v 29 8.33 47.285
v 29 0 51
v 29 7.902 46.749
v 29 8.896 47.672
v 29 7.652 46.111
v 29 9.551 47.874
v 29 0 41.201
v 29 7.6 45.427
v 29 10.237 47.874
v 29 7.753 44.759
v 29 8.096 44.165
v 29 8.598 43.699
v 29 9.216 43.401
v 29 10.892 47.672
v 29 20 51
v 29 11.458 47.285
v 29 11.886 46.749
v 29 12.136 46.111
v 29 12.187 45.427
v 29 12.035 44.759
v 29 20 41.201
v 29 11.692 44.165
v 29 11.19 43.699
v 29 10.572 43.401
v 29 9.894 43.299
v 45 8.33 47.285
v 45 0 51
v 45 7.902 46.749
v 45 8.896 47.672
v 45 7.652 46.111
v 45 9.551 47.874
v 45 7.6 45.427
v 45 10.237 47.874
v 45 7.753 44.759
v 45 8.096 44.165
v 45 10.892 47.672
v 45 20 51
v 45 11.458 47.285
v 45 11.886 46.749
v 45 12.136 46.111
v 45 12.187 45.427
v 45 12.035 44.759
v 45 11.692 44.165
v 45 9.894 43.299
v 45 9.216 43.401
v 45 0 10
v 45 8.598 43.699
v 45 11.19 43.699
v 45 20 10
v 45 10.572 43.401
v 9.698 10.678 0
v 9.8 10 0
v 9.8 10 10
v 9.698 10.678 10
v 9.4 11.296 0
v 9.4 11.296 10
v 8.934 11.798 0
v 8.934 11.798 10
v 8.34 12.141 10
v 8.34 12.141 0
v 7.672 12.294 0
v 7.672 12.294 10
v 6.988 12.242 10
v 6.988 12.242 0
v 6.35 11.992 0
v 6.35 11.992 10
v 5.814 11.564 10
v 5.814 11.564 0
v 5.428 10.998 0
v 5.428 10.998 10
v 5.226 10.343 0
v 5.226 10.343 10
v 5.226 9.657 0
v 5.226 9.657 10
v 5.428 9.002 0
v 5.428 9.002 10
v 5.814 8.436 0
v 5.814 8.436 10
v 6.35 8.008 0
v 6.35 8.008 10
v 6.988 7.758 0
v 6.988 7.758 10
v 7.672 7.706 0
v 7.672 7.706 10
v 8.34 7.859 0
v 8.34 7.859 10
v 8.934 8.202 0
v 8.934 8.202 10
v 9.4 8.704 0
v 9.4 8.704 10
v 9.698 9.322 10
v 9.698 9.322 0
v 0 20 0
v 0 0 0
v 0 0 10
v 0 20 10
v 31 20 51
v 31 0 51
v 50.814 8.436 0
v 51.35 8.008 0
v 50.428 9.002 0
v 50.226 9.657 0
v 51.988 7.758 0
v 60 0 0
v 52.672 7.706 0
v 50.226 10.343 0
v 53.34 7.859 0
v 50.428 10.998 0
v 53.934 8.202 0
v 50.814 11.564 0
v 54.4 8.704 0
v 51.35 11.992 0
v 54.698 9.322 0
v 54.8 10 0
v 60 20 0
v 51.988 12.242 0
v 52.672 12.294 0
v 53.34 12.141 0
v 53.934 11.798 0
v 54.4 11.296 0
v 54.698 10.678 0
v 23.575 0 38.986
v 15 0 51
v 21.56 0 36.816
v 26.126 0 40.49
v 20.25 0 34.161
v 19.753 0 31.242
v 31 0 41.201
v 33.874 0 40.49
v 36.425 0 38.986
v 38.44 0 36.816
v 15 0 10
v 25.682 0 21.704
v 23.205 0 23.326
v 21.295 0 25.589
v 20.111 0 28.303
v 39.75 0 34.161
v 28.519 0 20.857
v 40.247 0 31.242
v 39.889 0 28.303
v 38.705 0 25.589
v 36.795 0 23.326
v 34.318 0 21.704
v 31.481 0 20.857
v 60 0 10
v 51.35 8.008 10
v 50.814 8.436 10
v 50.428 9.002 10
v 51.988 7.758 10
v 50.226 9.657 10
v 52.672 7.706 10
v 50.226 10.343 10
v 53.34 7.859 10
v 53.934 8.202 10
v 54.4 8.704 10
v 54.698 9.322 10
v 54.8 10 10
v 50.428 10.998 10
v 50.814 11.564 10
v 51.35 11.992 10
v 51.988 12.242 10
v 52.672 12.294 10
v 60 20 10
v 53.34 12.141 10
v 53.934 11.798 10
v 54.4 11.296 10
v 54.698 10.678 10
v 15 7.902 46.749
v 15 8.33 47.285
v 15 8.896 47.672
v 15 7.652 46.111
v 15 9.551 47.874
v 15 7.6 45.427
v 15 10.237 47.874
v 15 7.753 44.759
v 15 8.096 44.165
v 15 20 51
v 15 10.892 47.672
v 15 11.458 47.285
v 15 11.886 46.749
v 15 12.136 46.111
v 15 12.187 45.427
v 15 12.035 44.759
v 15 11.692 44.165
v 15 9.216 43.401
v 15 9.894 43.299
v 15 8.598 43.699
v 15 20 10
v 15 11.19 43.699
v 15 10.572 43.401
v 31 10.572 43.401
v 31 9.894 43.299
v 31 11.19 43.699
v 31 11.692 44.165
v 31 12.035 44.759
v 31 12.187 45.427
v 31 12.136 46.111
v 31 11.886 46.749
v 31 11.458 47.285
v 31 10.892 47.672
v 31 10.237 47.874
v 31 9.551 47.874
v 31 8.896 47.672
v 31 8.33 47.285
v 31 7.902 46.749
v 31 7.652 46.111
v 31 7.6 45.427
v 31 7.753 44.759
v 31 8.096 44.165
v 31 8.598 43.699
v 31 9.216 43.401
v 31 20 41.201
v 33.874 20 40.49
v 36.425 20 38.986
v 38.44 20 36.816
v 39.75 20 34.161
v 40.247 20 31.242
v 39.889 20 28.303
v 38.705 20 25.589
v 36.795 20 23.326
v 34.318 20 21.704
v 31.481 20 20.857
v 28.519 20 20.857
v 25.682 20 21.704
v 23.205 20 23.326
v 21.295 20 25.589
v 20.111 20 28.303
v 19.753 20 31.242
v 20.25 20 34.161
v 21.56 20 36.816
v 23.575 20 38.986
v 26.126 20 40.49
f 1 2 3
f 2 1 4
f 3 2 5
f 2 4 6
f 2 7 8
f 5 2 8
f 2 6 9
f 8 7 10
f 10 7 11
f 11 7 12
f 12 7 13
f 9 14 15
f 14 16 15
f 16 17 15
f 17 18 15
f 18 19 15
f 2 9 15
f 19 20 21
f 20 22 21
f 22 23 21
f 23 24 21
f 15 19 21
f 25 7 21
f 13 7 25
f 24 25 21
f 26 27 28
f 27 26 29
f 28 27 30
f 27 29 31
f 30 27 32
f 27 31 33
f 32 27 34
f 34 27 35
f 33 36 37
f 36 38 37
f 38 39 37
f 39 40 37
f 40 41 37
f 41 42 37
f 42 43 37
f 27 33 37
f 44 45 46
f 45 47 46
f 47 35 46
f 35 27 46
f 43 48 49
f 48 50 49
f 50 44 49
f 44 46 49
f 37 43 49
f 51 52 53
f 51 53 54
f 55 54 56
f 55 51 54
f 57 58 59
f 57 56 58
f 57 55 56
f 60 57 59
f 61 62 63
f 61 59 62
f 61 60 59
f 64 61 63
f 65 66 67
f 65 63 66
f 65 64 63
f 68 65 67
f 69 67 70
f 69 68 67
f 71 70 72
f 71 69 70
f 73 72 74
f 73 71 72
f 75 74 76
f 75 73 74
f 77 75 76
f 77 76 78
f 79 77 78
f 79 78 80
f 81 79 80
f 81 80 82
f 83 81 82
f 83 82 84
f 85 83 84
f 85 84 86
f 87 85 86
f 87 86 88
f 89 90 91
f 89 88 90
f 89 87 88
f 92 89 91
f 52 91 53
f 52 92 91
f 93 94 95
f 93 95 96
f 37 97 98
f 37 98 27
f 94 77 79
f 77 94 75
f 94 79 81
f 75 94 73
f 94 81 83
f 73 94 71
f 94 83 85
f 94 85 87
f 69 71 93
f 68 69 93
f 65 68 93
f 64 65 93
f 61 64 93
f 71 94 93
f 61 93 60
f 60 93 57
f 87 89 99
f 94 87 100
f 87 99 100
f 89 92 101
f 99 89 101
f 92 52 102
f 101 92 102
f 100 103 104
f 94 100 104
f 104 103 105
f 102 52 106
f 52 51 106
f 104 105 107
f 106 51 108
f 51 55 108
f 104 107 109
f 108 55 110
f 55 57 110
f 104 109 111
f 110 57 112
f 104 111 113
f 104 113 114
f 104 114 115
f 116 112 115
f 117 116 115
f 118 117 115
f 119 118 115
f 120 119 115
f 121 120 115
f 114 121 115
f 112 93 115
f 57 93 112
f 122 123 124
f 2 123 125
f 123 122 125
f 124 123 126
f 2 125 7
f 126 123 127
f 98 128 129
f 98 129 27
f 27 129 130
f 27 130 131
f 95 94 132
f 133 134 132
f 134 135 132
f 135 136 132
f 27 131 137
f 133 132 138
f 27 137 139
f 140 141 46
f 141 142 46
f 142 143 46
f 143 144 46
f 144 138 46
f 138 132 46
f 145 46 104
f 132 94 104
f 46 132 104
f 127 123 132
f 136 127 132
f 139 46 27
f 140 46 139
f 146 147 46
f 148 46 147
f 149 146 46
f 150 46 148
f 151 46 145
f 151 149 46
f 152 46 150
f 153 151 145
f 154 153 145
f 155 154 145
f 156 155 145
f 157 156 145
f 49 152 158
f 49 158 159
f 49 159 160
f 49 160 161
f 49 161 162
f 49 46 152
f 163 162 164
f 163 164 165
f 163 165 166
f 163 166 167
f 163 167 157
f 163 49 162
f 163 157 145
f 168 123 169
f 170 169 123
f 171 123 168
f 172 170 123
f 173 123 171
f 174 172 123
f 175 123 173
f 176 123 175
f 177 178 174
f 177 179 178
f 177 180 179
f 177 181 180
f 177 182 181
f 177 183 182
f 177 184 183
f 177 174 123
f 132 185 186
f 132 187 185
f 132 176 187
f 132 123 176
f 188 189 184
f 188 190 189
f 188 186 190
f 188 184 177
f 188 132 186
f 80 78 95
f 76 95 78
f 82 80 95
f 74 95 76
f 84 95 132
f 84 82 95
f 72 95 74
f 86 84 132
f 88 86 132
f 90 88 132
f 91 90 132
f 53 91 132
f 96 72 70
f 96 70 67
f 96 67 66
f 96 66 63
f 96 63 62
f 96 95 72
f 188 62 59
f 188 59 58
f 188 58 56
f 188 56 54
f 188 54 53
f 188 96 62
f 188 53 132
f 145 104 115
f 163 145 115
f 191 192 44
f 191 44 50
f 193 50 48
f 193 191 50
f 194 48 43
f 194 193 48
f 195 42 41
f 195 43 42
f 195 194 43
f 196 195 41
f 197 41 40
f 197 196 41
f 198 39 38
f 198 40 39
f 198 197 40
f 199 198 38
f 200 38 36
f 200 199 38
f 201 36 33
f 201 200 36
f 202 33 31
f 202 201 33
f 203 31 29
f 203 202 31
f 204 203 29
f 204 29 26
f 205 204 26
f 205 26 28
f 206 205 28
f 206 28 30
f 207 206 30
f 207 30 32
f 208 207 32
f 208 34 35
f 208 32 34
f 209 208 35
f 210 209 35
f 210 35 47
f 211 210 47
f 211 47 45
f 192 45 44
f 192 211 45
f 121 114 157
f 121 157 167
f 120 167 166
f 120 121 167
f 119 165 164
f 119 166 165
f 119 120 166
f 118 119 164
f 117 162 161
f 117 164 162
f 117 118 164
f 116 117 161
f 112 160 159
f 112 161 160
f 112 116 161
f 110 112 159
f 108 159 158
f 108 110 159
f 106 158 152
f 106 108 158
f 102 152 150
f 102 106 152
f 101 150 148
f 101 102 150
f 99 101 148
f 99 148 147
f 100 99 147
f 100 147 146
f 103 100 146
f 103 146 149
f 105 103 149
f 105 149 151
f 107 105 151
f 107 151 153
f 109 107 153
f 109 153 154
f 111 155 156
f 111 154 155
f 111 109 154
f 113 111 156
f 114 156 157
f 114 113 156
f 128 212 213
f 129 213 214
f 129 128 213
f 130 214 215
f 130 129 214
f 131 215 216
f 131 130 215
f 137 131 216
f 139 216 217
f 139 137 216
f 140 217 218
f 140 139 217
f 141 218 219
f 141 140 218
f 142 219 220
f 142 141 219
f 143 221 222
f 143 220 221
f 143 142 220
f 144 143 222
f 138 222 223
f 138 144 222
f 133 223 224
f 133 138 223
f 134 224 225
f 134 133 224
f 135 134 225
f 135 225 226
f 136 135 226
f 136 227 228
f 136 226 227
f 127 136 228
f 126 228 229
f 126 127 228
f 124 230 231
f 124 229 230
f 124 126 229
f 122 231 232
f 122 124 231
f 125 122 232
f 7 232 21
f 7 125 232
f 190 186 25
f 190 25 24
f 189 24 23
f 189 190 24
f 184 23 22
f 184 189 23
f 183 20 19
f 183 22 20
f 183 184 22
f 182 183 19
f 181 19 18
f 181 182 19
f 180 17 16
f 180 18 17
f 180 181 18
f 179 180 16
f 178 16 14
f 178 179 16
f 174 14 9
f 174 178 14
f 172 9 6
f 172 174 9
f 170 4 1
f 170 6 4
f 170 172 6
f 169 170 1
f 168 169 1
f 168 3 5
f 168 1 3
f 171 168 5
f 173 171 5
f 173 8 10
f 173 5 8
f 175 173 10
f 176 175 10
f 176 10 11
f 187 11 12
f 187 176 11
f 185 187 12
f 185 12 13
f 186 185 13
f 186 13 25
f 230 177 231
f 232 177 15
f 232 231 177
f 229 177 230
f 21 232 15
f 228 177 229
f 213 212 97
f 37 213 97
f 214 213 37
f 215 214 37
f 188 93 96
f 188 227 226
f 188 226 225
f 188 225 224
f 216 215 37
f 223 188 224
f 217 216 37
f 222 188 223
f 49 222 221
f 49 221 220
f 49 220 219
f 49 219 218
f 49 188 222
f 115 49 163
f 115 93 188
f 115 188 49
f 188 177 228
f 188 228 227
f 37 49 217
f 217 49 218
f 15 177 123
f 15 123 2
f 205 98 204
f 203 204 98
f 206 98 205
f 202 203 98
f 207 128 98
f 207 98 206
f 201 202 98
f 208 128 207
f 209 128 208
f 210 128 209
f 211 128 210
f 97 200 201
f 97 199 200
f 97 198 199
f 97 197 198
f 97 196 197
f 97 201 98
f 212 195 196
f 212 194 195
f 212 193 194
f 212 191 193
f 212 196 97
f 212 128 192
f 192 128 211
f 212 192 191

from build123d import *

# Parameters (mm, degrees)
BOX002_W                    = 2
BOX002_H                    = 25
BOX002_DEPTH                = 15
CYLINDER003_R               = 2.3
CYLINDER003_DEPTH           = 33
CYLINDER003_PITCH_ANGLE     = 90
CYLINDER003_PLACEMENT_ANGLE = 7e-06
CYLINDER002_R               = 2.3
CYLINDER002_DEPTH           = 13
CYLINDER001_R               = 2.3
CYLINDER001_DEPTH           = 13
CYLINDER_R                  = 10.25
CYLINDER_DEPTH              = 25
CYLINDER_ROLL_ANGLE         = -90
BOX001_W                    = 30
BOX001_H                    = 20
BOX001_DEPTH                = 41
BOX_W                       = 60
BOX_H                       = 20
BOX_DEPTH                   = 10


with BuildPart() as box002:
    # Box002 → Box002 (new body)
    with BuildSketch(Plane(origin=(29, -2.73, 37.37), x_dir=(1, 0, 0), z_dir=(0, 0, 1))):
        with Locations((1, 12.5)):
            Rectangle(BOX002_W, BOX002_H)
    extrude(amount=BOX002_DEPTH)


with BuildPart() as cylinder003:
    # Cylinder003 → Cylinder003 (new body)
    with BuildSketch(Plane.XY):
        Circle(CYLINDER003_R)
    extrude(amount=CYLINDER003_DEPTH)


with BuildPart() as cylinder003_1:
    # Cylinder003 pitch: moved
    add(cylinder003.part.rotate(Axis((0, 0, 0), (0, 1, 0)), CYLINDER003_PITCH_ANGLE))


with BuildPart() as cylinder003_2:
    # Cylinder003 placement: moved
    add(cylinder003_1.part.moved(Location((13.120832, 9.893917, 45.599278))).rotate(Axis((13.120832, 9.893917, 45.599278), (0, 0, 1)), CYLINDER003_PLACEMENT_ANGLE))


with BuildPart() as cylinder002:
    # Cylinder002 → Cylinder002 (new body)
    with BuildSketch(Plane(origin=(52.5, 10, -2), x_dir=(1, 0, 0), z_dir=(0, 0, 1))):
        Circle(CYLINDER002_R)
    extrude(amount=CYLINDER002_DEPTH)


with BuildPart() as cylinder001:
    # Cylinder001 → Cylinder001 (new body)
    with BuildSketch(Plane(origin=(7.5, 10, -2), x_dir=(1, 0, 0), z_dir=(0, 0, 1))):
        Circle(CYLINDER001_R)
    extrude(amount=CYLINDER001_DEPTH)


with BuildPart() as cylinder:
    # Cylinder → Cylinder (new body)
    with BuildSketch(Plane.XY):
        Circle(CYLINDER_R)
    extrude(amount=CYLINDER_DEPTH)


with BuildPart() as cylinder_1:
    # Cylinder roll: moved
    add(cylinder.part.rotate(Axis((0, 0, 0), (1, 0, 0)), CYLINDER_ROLL_ANGLE))


with BuildPart() as cylinder_2:
    # Cylinder placement: moved
    add(cylinder_1.part.moved(Location((30, -3.23131, 31))))


with BuildPart() as cut:
    # Box001 → Box001 (new body)
    with BuildSketch(Plane(origin=(15, 0, 10), x_dir=(1, 0, 0), z_dir=(0, 0, 1))):
        with Locations((15, 10)):
            Rectangle(BOX001_W, BOX001_H)
    extrude(amount=BOX001_DEPTH)

    # Cut: cut Cylinder
    add(cylinder_2.part, mode=Mode.SUBTRACT)


with BuildPart() as cut004:
    # Box → Box (new body)
    with BuildSketch(Plane.XY):
        with Locations((30, 10)):
            Rectangle(BOX_W, BOX_H)
    extrude(amount=BOX_DEPTH)

    # Fusion: union Cut
    add(cut.part)

    # Cut001: cut Cylinder001
    add(cylinder001.part, mode=Mode.SUBTRACT)

    # Cut002: cut Cylinder002
    add(cylinder002.part, mode=Mode.SUBTRACT)

    # Cut003: cut Cylinder003
    add(cylinder003_2.part, mode=Mode.SUBTRACT)

    # Cut004: cut Box002
    add(box002.part, mode=Mode.SUBTRACT)


solid = cut004.part
